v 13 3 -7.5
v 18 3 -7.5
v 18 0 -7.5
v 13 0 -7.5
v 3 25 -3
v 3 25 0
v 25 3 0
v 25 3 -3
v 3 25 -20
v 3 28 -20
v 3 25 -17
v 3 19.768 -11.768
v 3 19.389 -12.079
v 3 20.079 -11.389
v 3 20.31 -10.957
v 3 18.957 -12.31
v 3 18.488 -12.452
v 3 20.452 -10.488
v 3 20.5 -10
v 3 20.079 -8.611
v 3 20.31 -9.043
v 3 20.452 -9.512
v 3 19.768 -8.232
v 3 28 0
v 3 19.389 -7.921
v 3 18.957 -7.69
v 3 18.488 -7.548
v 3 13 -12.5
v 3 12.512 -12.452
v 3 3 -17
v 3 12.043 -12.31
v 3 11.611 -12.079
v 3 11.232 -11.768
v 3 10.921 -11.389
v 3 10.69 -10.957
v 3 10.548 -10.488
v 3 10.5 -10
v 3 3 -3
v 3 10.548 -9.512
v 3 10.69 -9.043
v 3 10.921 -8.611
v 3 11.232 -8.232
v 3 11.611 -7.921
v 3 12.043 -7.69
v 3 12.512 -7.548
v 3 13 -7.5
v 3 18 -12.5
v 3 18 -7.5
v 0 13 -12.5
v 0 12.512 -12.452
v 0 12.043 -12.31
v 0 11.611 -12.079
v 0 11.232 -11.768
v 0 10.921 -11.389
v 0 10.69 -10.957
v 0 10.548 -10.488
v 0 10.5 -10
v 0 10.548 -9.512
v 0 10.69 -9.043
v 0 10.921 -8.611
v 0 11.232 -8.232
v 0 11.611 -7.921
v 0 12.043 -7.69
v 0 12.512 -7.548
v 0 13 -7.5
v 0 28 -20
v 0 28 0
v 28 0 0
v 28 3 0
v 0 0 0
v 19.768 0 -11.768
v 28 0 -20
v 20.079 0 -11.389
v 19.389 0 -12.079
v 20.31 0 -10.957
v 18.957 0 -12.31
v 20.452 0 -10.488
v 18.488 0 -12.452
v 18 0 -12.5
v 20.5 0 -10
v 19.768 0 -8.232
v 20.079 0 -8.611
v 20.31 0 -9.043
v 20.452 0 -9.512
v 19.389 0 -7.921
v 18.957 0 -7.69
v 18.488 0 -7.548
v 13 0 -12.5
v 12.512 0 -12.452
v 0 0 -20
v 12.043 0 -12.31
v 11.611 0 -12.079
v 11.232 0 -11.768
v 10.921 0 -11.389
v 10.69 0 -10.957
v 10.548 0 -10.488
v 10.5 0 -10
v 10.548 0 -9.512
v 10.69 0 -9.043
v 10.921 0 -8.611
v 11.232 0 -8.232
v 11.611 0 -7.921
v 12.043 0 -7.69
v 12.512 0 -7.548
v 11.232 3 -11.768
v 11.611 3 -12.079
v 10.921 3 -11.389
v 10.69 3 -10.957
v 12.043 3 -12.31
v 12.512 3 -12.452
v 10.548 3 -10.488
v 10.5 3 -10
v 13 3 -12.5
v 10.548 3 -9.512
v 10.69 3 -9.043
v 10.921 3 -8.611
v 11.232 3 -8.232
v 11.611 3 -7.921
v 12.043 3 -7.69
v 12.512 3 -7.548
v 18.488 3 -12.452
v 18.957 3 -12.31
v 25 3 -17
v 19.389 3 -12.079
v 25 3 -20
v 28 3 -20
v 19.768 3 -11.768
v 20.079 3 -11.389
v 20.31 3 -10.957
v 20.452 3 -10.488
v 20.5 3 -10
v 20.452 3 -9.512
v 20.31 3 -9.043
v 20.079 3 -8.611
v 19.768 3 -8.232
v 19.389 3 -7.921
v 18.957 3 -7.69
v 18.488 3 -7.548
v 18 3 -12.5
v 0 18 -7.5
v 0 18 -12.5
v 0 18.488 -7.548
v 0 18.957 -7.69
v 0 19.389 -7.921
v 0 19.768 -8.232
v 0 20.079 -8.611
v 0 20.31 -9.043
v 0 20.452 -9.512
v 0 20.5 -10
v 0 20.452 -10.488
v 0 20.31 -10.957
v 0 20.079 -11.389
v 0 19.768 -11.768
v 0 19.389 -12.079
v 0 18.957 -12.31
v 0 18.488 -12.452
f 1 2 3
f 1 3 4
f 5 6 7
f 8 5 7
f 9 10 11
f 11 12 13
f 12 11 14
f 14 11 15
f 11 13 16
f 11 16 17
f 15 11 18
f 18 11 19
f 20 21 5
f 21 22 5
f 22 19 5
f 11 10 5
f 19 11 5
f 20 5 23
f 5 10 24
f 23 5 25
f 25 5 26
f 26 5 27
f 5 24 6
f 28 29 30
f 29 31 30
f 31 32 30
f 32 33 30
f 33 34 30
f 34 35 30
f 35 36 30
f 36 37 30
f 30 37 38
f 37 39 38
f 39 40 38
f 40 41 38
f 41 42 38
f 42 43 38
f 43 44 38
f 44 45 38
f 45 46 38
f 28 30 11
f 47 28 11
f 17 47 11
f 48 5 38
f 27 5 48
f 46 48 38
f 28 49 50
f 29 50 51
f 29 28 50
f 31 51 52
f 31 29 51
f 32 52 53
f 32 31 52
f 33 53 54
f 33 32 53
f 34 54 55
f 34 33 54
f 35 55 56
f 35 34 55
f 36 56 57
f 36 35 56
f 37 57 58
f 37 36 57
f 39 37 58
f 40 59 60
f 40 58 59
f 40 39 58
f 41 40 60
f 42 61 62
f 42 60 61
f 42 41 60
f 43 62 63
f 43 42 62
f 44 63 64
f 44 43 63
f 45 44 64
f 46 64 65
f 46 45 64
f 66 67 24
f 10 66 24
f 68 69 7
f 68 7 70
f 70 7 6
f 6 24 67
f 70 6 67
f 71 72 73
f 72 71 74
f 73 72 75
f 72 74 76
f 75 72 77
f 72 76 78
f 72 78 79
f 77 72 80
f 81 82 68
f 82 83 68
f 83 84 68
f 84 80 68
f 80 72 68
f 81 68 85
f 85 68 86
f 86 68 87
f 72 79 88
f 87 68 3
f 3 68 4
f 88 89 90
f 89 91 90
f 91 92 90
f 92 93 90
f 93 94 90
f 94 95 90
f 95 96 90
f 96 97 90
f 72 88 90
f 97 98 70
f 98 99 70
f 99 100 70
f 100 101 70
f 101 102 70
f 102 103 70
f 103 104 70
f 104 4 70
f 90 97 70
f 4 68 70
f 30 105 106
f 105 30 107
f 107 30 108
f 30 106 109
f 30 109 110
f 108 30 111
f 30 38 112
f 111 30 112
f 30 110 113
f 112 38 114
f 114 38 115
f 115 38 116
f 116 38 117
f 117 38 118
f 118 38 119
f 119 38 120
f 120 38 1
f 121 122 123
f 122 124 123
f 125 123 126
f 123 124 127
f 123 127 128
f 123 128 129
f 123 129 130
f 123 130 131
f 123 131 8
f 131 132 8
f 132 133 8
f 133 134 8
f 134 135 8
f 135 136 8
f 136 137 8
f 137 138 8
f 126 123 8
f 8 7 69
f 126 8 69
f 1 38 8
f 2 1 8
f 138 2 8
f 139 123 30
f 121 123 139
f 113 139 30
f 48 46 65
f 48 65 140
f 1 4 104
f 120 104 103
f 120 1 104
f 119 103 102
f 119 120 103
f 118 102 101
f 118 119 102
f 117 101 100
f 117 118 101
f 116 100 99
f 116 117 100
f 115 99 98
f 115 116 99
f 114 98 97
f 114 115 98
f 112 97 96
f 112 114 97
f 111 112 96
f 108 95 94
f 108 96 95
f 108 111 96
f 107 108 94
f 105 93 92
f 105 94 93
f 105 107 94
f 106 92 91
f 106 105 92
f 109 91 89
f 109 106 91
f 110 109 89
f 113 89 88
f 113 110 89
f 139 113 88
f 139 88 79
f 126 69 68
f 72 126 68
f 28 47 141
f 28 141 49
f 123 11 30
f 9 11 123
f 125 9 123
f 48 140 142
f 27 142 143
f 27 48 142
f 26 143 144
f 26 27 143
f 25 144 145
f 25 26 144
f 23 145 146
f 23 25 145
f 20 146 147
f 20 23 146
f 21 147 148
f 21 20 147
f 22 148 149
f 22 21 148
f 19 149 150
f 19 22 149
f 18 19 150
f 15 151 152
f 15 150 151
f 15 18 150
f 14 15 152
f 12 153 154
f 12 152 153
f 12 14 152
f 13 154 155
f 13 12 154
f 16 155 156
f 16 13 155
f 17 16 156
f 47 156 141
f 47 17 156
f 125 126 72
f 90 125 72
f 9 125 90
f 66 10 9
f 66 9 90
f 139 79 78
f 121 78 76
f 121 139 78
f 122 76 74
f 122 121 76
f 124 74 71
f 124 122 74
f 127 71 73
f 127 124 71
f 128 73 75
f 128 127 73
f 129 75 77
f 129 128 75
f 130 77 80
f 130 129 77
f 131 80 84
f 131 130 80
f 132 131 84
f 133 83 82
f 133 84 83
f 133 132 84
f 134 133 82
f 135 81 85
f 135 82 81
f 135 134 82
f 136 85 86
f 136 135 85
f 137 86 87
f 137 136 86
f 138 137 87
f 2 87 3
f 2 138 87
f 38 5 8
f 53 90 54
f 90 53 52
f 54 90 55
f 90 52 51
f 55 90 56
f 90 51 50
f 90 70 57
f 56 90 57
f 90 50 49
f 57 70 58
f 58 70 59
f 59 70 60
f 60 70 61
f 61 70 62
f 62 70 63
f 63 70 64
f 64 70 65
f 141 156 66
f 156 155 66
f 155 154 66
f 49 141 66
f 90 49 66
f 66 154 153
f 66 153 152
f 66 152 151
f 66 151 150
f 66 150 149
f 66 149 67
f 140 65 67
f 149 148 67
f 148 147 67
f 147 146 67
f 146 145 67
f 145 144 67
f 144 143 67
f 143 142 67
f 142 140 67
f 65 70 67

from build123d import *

# Parameters (mm, degrees)
BOSS_EXTRUDE1_DEPTH = 20
CUT_EXTRUDE1_DEPTH  = 14
CUT_EXTRUDE2_DEPTH  = 14
CUT_EXTRUDE3_DEPTH  = 14


with BuildPart() as part:
    # Sketch1 → Boss-Extrude1 (new body)
    with BuildSketch(Plane.XY):
        Polygon((0, 0), (0, 28), (3, 28), (3, 25), (25, 3), (28, 3), (28, 0), align=None)
    extrude(amount=-BOSS_EXTRUDE1_DEPTH)

    # Sketch2 → Cut-Extrude1 (cut)
    with BuildSketch(Plane.XY.offset(-3)):
        Polygon((3, 25), (3, 3), (25, 3), align=None)
    extrude(amount=-CUT_EXTRUDE1_DEPTH, mode=Mode.SUBTRACT)

    # Sketch3 → Cut-Extrude2 (cut)
    with BuildSketch(Plane(origin=(0, 3, 0), x_dir=(1, 0, 0), z_dir=(0, 1, 0))):
        with BuildLine():
            Line((18, 7.5), (13, 7.5))
            ThreePointArc((13, 7.5), (10.5, 10), (13, 12.5))
            Line((13, 12.5), (18, 12.5))
            ThreePointArc((18, 12.5), (20.5, 10), (18, 7.5))
        make_face()
    extrude(amount=-CUT_EXTRUDE2_DEPTH, mode=Mode.SUBTRACT)

    # Sketch4 → Cut-Extrude3 (cut)
    with BuildSketch(Plane(origin=(3, 0, 0), x_dir=(0, 0, -1), z_dir=(1, 0, 0))):
        with BuildLine():
            Line((7.5, 13), (7.5, 18))
            ThreePointArc((7.5, 18), (10, 20.5), (12.5, 18))
            Line((12.5, 18), (12.5, 13))
            ThreePointArc((12.5, 13), (10, 10.5), (7.5, 13))
        make_face()
    extrude(amount=-CUT_EXTRUDE3_DEPTH, mode=Mode.SUBTRACT)


solid = part.part
